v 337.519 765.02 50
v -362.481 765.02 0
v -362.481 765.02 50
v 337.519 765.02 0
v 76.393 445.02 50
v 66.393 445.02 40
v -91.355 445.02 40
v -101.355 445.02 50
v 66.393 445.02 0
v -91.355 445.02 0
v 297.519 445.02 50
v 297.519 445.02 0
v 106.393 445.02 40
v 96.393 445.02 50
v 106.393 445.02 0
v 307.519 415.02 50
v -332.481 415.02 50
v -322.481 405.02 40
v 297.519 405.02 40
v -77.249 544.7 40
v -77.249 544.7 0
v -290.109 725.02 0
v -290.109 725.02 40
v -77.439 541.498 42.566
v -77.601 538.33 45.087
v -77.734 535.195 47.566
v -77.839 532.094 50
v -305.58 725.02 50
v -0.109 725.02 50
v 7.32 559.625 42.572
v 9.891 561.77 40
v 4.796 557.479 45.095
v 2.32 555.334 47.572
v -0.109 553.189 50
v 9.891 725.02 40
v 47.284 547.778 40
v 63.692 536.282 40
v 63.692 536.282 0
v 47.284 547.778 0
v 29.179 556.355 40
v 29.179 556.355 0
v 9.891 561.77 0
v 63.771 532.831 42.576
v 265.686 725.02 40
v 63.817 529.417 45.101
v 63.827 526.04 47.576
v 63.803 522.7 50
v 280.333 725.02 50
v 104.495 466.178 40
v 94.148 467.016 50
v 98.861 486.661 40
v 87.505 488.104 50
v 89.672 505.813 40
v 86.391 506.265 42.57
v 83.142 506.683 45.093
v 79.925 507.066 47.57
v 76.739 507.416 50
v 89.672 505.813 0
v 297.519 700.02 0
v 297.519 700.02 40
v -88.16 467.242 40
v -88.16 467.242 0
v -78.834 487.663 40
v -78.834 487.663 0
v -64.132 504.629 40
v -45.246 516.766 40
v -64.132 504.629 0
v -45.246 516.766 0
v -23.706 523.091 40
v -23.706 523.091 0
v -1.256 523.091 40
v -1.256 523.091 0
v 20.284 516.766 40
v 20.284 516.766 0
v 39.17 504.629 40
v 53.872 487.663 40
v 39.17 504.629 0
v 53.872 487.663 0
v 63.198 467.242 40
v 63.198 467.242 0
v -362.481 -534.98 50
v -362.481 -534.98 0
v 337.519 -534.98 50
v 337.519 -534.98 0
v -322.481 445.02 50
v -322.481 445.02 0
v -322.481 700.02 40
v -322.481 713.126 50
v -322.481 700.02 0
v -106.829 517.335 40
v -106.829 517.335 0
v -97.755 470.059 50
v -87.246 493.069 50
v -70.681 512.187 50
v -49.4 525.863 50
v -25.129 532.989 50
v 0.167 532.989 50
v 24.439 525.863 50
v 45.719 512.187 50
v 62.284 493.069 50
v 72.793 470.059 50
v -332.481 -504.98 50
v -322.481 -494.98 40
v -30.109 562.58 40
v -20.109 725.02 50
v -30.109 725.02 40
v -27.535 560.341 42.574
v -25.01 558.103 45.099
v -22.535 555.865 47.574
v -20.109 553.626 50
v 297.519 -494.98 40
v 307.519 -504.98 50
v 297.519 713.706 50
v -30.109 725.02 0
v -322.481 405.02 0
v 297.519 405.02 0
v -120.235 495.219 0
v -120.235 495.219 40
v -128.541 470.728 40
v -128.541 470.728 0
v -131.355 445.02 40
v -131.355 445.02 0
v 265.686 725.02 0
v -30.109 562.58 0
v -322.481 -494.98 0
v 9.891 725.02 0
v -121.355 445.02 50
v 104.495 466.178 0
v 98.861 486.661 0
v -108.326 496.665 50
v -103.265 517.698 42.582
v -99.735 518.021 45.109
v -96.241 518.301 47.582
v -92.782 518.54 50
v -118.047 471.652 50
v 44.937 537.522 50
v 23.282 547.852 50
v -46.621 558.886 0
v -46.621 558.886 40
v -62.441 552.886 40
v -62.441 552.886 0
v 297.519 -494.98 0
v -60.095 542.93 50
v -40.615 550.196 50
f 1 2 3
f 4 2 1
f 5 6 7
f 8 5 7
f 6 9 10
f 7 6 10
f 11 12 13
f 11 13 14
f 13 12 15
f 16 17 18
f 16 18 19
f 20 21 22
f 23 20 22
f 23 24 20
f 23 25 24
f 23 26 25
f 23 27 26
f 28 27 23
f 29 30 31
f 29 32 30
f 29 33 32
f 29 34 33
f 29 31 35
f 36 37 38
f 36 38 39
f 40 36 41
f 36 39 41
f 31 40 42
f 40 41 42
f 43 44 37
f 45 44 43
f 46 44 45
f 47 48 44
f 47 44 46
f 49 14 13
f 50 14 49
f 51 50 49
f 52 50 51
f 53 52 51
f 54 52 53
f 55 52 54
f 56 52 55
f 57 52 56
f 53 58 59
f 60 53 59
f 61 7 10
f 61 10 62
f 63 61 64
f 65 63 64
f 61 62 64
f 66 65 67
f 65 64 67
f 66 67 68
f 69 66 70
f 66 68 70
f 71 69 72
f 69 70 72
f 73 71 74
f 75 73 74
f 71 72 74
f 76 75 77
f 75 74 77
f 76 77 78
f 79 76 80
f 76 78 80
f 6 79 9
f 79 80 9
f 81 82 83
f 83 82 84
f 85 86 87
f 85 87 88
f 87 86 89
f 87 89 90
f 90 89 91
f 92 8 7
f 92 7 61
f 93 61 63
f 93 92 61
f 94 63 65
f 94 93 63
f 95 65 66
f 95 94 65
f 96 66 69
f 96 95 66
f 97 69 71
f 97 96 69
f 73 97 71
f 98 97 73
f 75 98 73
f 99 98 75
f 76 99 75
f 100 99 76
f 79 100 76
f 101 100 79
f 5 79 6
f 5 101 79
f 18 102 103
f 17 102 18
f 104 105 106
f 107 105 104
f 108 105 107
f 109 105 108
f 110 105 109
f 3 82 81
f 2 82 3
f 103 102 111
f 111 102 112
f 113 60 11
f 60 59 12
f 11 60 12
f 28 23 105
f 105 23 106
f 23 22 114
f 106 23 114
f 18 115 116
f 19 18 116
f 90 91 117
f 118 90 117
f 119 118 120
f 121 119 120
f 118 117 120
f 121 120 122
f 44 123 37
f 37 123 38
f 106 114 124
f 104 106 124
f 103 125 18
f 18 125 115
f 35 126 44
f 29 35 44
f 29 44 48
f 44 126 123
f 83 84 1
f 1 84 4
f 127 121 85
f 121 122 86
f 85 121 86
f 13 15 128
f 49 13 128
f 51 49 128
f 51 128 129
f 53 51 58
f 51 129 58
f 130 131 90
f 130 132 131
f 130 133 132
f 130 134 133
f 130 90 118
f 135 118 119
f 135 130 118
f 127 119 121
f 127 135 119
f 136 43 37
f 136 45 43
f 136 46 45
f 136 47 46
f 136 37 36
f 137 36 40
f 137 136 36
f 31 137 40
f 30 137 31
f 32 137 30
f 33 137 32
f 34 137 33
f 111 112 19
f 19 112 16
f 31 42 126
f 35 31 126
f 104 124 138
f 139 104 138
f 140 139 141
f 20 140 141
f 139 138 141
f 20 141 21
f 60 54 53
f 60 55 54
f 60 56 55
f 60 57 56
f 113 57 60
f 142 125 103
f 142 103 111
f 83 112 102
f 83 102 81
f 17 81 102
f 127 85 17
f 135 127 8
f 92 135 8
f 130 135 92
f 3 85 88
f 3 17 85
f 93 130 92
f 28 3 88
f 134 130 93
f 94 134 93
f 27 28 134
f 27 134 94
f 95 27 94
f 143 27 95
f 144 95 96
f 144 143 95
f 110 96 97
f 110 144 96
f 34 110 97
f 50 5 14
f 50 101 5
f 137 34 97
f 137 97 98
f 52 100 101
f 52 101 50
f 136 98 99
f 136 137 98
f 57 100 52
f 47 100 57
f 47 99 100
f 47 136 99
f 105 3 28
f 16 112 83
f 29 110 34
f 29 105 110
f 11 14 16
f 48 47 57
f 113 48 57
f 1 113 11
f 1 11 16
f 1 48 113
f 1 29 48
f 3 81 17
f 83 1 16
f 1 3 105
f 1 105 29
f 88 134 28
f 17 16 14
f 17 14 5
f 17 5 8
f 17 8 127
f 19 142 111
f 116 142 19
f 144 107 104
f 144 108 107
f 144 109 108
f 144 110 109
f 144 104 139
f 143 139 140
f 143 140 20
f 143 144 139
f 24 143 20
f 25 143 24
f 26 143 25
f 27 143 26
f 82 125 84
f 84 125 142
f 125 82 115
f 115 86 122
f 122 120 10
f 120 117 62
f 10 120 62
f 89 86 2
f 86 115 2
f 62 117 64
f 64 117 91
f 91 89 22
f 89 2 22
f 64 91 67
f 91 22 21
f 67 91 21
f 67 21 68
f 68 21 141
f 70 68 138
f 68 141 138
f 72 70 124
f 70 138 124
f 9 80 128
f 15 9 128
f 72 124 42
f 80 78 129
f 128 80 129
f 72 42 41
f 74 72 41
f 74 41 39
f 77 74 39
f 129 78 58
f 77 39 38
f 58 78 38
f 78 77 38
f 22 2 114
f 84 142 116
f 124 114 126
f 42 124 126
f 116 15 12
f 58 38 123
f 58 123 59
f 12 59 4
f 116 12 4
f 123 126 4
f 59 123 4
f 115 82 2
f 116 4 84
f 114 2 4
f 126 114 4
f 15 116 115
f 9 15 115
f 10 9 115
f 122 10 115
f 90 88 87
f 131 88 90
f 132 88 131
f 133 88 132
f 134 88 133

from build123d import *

# Parameters (mm, degrees)
F0_W     = 700
F0_H     = 1300
F0_W_2   = 620
F0_H_2   = 900
F1_DEPTH = 50
F2_SIZE  = 10


# Not quite as in the source:
# - a feature names something its author has since deleted; it is built from what else it names


with BuildPart() as f1:
    # F0 (on Top) → F1 (new body)
    with BuildSketch(Plane.XY):
        with Locations((-12.4809433535, 115.0203361814)):
            Rectangle(F0_W, F0_H)
        with Locations((-12.4809433535, -44.9796638186)):
            Rectangle(F0_W_2, F0_H_2, mode=Mode.SUBTRACT)
        Polygon((-131.3545905658, 445.0203361814), (-322.4809433535, 445.0203361814), (-322.4809433535, 700.0203361814), (-322.4809433535, 725.0203361814), (-290.108913989, 725.0203361814), (-30.108913989, 725.0203361814), (9.891086011, 725.0203361814), (265.6861508147, 725.0203361814), (297.5190566465, 725.0203361814), (297.5190566465, 700.0203361814), (297.5190566465, 445.0203361814), (106.3927038589, 445.0203361814), (66.3927038589, 445.0203361814), (-91.3545905658, 445.0203361814), align=None, mode=Mode.SUBTRACT)
        with BuildLine():
            Line((-322.4809433535, 725.0203361814), (-322.4809433535, 700.0203361814))
            Line((-322.4809433535, 700.0203361814), (-106.829258799, 517.3345075045))
            ThreePointArc((-106.829258799, 517.3345075045), (-93.2073200284, 532.2796973439), (-77.2493518889, 544.6998087791))
            Line((-77.2493518889, 544.6998087791), (-290.108913989, 725.0203361814))
            Line((-290.108913989, 725.0203361814), (-322.4809433535, 725.0203361814))
        make_face()
        with BuildLine():
            ThreePointArc((-106.829258799, 517.3345075045), (-125.0564121886, 483.2002761775), (-131.3545905658, 445.0203361814))
            Line((-131.3545905658, 445.0203361814), (-91.3545905658, 445.0203361814))
            ThreePointArc((-91.3545905658, 445.0203361814), (-12.4809433535, 523.8939833937), (66.3927038589, 445.0203361814))
            Line((66.3927038589, 445.0203361814), (106.3927038589, 445.0203361814))
            ThreePointArc((106.3927038589, 445.0203361814), (102.1362449296, 476.5456300205), (89.6716866284, 505.8132978575))
            ThreePointArc((89.6716866284, 505.8132978575), (77.9737439548, 522.1494068715), (63.691579675, 536.2819970091))
            ThreePointArc((63.691579675, 536.2819970091), (38.4127121689, 552.4483578012), (9.891086011, 561.7697957248))
            ThreePointArc((9.891086011, 561.7697957248), (-10.0745975152, 563.8696252044), (-30.108913989, 562.5796771664))
            ThreePointArc((-30.108913989, 562.5796771664), (-54.6379504639, 556.16767422), (-77.2493518889, 544.6998087791))
            ThreePointArc((-77.2493518889, 544.6998087791), (-93.2073200284, 532.2796973439), (-106.829258799, 517.3345075045))
        make_face()
        with BuildLine():
            Line((-30.108913989, 725.0203361814), (-30.108913989, 562.5796771664))
            ThreePointArc((-30.108913989, 562.5796771664), (-10.0745975152, 563.8696252044), (9.891086011, 561.7697957248))
            Line((9.891086011, 561.7697957248), (9.891086011, 725.0203361814))
            Line((9.891086011, 725.0203361814), (-30.108913989, 725.0203361814))
        make_face()
        with BuildLine():
            ThreePointArc((63.691579675, 536.2819970091), (77.9737439548, 522.1494068715), (89.6716866284, 505.8132978575))
            Line((89.6716866284, 505.8132978575), (297.5190566465, 700.0203361814))
            Line((297.5190566465, 700.0203361814), (297.5190566465, 725.0203361814))
            Line((297.5190566465, 725.0203361814), (265.6861508147, 725.0203361814))
            Line((265.6861508147, 725.0203361814), (63.691579675, 536.2819970091))
        make_face()
    extrude(amount=F1_DEPTH)

    # F2
    f2_edges = [f1.edges().sort_by_distance(p)[0] for p in [
        (-12.480943, 405.020336, 50),
        (297.519057, -44.979664, 50),
        (-12.480943, -494.979664, 50),
        (-322.480943, -44.979664, 50),
        (-12.480943, 523.893983, 50),
        (-54.63795, 556.167674, 50),
        (102.136245, 476.54563, 50),
        (-214.655101, 608.677422, 50),
        (-183.679133, 634.860072, 50),
        (-30.108914, 643.800007, 50),
        (38.412712, 552.448358, 50),
        (-125.056412, 483.200276, 50),
        (193.595372, 602.916817, 50),
        (164.688865, 630.651167, 50),
        (9.891086, 643.395066, 50),
    ]]
    chamfer(f2_edges, length=F2_SIZE)


solid = f1.part
